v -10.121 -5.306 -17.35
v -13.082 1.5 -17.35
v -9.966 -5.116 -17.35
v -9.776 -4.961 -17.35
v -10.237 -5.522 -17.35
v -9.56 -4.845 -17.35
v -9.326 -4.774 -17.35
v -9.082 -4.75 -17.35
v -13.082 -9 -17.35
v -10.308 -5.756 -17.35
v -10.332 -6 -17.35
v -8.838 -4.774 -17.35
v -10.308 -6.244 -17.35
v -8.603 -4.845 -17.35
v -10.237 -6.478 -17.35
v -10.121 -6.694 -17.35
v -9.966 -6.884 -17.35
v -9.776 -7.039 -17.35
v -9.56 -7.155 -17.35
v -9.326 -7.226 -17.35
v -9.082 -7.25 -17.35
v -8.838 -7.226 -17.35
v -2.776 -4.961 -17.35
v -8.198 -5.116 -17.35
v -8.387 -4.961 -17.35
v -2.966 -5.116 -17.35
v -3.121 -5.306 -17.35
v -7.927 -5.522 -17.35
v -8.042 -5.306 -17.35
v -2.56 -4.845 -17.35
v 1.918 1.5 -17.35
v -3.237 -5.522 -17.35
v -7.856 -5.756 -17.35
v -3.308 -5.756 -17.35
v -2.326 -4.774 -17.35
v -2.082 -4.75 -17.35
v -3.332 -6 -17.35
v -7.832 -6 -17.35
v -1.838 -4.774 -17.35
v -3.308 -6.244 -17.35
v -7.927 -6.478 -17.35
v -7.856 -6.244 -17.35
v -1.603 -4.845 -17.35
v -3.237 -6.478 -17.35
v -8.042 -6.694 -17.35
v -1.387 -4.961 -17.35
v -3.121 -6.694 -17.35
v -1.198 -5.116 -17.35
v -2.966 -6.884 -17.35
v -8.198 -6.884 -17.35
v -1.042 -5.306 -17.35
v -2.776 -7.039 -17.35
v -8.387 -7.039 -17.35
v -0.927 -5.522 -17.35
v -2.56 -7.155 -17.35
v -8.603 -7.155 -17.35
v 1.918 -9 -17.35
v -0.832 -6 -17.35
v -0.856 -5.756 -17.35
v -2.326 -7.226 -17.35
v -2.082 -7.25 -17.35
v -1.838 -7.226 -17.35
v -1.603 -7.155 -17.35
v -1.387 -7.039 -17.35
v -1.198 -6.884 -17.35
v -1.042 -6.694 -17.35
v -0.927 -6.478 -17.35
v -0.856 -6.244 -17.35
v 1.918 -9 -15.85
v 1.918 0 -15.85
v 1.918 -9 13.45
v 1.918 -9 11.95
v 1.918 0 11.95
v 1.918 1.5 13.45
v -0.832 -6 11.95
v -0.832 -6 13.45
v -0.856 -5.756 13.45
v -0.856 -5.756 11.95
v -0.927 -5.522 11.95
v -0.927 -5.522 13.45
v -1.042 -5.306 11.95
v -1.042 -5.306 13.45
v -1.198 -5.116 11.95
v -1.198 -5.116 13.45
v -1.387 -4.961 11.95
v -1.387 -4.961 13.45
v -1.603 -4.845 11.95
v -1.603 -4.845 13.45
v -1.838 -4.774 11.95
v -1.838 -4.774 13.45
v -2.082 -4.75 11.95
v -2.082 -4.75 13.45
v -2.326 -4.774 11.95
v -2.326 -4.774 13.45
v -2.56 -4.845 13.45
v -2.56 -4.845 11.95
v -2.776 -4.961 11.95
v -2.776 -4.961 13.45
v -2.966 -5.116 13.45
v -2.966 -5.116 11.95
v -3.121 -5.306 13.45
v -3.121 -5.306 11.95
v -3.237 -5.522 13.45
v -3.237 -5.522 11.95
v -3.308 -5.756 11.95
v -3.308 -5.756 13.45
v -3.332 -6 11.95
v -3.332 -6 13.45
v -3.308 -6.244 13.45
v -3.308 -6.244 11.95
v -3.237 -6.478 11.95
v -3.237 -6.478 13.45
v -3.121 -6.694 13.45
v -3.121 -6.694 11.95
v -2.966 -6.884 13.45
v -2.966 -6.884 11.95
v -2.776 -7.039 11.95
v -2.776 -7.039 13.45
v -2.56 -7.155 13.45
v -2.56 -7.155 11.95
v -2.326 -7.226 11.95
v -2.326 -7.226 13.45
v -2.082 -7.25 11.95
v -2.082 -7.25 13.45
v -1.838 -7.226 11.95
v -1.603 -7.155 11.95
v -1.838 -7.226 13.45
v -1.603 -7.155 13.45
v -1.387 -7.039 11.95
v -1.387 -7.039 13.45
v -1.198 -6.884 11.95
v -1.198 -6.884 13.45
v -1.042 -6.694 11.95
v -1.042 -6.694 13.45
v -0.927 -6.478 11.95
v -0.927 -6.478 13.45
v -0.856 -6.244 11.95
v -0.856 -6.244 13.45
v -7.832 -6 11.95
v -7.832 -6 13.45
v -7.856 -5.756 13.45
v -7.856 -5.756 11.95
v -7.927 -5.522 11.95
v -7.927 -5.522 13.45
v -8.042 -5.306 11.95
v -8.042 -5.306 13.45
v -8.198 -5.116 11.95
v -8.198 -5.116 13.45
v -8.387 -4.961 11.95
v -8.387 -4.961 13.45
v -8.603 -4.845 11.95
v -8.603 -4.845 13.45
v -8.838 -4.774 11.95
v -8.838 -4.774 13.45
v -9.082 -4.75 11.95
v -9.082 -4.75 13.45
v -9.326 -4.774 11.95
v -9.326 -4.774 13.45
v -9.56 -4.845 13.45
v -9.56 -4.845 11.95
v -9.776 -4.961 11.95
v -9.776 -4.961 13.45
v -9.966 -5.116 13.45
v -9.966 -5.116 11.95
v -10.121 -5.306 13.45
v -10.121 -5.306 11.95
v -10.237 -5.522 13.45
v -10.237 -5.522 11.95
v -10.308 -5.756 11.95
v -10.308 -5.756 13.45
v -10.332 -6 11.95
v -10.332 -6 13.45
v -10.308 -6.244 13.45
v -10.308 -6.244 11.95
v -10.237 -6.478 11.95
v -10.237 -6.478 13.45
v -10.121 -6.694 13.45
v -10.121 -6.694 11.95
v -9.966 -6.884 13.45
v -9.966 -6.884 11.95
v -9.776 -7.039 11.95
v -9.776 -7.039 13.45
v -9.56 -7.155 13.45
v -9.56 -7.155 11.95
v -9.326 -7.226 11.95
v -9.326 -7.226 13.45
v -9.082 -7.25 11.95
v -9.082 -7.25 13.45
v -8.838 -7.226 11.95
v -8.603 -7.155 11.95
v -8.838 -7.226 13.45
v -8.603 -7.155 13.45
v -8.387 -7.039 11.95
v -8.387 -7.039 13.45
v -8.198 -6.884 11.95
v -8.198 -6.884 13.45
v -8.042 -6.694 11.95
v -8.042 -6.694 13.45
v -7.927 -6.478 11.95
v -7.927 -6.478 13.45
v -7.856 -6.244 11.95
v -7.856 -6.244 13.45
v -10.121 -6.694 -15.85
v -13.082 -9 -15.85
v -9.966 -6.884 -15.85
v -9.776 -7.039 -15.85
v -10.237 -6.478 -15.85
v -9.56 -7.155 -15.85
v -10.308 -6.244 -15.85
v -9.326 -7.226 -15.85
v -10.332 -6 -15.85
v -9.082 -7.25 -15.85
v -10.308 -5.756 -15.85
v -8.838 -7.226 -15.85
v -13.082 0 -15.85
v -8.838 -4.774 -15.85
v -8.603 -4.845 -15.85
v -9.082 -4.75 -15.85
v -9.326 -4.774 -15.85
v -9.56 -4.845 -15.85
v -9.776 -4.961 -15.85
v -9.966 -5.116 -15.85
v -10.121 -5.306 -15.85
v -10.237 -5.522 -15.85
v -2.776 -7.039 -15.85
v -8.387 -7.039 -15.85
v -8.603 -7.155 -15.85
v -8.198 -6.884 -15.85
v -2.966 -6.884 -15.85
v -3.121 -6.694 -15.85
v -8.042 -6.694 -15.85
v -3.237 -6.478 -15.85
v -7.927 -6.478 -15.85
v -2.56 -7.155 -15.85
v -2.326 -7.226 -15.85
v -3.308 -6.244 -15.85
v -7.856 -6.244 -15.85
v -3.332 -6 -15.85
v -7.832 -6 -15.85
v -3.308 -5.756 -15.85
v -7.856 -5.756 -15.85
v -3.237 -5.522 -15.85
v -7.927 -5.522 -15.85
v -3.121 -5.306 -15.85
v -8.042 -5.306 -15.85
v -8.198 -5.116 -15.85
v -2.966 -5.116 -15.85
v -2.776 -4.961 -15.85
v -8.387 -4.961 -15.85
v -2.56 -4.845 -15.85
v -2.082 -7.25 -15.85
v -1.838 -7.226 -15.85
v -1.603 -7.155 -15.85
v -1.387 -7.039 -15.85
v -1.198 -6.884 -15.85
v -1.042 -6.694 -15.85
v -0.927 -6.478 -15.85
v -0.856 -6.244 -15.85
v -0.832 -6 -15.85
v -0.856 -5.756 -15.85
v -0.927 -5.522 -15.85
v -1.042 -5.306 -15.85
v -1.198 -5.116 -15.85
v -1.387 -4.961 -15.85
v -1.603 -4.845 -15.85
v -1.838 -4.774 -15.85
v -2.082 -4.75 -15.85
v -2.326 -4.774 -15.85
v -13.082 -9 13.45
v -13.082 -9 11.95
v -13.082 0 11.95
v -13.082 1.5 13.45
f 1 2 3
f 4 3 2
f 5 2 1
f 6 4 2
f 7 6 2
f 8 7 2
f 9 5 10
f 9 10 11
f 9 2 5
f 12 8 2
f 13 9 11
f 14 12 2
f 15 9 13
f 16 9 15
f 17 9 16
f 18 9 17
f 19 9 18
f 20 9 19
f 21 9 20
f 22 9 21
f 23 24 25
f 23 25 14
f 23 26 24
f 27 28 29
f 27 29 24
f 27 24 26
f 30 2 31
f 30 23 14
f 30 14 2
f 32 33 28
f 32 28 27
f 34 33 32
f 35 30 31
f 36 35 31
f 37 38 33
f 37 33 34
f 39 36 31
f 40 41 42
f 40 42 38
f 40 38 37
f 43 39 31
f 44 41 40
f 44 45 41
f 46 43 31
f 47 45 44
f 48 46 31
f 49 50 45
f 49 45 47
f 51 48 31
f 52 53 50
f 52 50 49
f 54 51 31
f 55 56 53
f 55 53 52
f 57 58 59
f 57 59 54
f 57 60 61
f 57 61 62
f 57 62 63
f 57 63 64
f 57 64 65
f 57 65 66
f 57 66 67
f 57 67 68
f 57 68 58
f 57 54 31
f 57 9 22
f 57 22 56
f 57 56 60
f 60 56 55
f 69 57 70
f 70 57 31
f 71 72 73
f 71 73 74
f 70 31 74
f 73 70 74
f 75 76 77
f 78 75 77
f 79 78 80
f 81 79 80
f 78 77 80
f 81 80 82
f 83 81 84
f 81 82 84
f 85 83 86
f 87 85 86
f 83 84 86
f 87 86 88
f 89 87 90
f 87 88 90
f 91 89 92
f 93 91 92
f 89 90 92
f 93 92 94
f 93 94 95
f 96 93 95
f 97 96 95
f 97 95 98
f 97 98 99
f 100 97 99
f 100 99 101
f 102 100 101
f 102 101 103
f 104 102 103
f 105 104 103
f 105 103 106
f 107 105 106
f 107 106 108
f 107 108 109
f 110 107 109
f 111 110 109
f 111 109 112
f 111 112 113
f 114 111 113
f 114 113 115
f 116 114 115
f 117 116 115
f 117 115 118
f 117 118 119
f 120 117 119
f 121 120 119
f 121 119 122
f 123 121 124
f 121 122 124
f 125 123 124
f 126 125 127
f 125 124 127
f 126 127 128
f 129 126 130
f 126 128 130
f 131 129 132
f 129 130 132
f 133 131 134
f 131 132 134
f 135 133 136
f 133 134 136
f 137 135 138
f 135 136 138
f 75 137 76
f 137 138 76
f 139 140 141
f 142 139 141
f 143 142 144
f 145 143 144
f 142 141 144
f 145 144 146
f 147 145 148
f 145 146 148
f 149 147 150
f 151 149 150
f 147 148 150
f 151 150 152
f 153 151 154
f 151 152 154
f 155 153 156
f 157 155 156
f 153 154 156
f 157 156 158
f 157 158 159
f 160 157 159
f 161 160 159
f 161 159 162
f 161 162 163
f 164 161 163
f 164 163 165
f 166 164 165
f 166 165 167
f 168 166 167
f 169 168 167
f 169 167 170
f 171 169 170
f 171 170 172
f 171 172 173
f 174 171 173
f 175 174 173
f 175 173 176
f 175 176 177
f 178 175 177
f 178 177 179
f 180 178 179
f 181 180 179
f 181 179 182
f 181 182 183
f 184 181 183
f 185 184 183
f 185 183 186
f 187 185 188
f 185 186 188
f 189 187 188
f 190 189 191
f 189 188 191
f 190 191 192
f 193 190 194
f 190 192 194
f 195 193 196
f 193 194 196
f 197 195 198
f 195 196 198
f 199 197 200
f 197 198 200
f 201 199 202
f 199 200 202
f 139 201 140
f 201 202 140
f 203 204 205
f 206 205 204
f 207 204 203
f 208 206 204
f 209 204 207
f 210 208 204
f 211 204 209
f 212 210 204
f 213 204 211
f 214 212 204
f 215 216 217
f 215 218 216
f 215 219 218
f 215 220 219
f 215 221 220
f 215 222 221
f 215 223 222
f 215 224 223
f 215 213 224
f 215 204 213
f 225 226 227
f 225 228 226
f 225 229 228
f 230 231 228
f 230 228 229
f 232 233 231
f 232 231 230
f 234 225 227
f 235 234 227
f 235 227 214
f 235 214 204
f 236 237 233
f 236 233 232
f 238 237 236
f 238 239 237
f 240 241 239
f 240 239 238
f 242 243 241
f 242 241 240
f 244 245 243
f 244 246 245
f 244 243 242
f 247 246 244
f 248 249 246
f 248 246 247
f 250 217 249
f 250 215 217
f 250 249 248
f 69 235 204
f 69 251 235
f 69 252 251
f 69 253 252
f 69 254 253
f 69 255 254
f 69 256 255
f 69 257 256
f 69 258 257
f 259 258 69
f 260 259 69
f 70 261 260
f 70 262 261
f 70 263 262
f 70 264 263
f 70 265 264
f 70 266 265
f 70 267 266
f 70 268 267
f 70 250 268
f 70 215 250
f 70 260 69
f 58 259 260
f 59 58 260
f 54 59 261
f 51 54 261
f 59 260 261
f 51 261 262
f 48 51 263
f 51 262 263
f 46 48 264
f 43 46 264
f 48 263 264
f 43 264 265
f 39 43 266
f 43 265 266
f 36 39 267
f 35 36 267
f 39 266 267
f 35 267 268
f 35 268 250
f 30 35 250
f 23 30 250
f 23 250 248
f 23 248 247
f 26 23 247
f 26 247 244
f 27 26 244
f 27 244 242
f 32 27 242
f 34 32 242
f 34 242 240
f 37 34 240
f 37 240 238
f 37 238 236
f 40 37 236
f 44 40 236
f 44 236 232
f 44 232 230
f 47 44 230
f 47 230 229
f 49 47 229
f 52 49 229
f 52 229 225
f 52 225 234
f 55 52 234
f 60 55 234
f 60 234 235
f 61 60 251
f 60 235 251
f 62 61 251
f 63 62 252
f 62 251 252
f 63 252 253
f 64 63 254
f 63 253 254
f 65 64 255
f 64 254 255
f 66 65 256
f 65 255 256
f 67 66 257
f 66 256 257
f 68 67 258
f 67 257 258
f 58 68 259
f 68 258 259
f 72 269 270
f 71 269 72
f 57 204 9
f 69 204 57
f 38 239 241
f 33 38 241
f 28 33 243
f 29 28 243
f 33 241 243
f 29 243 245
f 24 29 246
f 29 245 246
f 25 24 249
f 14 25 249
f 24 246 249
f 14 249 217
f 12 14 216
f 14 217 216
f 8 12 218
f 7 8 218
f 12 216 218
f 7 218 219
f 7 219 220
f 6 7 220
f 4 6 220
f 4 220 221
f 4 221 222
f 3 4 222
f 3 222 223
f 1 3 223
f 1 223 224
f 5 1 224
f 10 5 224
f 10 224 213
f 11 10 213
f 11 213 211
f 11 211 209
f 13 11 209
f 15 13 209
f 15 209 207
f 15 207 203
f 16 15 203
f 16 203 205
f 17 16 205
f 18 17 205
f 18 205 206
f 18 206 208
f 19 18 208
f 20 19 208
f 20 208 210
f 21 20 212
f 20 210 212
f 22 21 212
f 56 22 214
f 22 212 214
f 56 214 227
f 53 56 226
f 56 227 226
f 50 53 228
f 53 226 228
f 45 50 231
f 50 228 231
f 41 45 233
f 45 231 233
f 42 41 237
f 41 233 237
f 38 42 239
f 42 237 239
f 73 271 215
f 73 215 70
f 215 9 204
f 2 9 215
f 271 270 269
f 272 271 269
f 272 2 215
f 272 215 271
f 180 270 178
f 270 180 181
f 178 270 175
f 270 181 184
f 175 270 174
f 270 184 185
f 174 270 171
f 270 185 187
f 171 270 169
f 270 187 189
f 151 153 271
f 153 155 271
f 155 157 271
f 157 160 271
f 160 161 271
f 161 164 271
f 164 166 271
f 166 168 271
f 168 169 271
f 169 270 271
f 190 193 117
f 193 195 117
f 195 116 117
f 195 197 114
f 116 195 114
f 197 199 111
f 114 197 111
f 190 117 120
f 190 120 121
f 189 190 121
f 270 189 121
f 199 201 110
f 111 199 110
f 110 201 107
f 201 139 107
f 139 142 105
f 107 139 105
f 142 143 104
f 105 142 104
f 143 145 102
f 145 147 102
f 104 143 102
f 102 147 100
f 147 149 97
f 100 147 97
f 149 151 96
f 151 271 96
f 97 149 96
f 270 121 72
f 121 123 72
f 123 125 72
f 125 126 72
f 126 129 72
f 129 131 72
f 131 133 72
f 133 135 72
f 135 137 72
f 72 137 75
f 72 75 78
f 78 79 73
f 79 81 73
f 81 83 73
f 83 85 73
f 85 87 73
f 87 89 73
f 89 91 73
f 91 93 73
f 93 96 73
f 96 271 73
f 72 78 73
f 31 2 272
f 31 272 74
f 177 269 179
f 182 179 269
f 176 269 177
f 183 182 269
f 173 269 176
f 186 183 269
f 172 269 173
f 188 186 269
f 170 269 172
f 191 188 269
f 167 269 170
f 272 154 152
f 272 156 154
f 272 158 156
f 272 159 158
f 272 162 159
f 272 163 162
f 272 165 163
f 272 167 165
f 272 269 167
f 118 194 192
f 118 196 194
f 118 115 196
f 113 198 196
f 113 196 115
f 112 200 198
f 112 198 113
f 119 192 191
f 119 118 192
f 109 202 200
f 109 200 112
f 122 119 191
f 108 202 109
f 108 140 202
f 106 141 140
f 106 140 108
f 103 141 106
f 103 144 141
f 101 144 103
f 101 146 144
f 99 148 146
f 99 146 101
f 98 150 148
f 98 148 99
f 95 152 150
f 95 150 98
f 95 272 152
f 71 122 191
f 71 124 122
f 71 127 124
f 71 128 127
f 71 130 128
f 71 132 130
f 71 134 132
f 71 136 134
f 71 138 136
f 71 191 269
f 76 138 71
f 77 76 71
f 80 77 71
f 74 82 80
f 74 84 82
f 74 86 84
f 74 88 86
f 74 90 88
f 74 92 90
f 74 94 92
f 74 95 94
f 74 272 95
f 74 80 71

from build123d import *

# Parameters (mm, degrees)
SKETCH_1_W               = 15
SKETCH_1_H               = 30.8
EXTRUDE_1_DEPTH          = 1.5
SKETCH_2_W               = 15
SKETCH_2_H               = 1.5
EXTRUDE_2_DEPTH          = 9
SKETCH_3_R               = 1.25
CUT_EXTRUDE_1_DEPTH      = 1
CUT_EXTRUDE_1_DEPTH_BACK = 31.8


with BuildPart() as part:
    # 草图1 → 凸台-拉伸1 (new body)
    with BuildSketch(Plane(origin=(0, 0, 0), x_dir=(1, 0, 0), z_dir=(0, 1, 0))):
        with Locations((-5.581761006, 1.950314465)):
            Rectangle(SKETCH_1_W, SKETCH_1_H)
    extrude(amount=EXTRUDE_1_DEPTH)

    # 草图2 → 凸台-拉伸2 (add)
    with BuildSketch(Plane.XZ):
        with Locations((-5.581761006, 12.699685535)):
            Rectangle(SKETCH_2_W, SKETCH_2_H)
        with Locations((-5.581761006, -16.600314465)):
            Rectangle(SKETCH_2_W, SKETCH_2_H)
    extrude(amount=EXTRUDE_2_DEPTH)

    # 草图3 → 切除-拉伸1 (cut, two sides)
    with BuildSketch(Plane.XY.offset(13.449685535)) as cut_extrude_1_sk:
        with Locations((-9.081761006, -6)):
            Circle(SKETCH_3_R)
        with Locations((-2.081761006, -6)):
            Circle(SKETCH_3_R)
    extrude(amount=CUT_EXTRUDE_1_DEPTH, mode=Mode.SUBTRACT)
    extrude(cut_extrude_1_sk.sketch, amount=-CUT_EXTRUDE_1_DEPTH_BACK, mode=Mode.SUBTRACT)


solid = part.part
